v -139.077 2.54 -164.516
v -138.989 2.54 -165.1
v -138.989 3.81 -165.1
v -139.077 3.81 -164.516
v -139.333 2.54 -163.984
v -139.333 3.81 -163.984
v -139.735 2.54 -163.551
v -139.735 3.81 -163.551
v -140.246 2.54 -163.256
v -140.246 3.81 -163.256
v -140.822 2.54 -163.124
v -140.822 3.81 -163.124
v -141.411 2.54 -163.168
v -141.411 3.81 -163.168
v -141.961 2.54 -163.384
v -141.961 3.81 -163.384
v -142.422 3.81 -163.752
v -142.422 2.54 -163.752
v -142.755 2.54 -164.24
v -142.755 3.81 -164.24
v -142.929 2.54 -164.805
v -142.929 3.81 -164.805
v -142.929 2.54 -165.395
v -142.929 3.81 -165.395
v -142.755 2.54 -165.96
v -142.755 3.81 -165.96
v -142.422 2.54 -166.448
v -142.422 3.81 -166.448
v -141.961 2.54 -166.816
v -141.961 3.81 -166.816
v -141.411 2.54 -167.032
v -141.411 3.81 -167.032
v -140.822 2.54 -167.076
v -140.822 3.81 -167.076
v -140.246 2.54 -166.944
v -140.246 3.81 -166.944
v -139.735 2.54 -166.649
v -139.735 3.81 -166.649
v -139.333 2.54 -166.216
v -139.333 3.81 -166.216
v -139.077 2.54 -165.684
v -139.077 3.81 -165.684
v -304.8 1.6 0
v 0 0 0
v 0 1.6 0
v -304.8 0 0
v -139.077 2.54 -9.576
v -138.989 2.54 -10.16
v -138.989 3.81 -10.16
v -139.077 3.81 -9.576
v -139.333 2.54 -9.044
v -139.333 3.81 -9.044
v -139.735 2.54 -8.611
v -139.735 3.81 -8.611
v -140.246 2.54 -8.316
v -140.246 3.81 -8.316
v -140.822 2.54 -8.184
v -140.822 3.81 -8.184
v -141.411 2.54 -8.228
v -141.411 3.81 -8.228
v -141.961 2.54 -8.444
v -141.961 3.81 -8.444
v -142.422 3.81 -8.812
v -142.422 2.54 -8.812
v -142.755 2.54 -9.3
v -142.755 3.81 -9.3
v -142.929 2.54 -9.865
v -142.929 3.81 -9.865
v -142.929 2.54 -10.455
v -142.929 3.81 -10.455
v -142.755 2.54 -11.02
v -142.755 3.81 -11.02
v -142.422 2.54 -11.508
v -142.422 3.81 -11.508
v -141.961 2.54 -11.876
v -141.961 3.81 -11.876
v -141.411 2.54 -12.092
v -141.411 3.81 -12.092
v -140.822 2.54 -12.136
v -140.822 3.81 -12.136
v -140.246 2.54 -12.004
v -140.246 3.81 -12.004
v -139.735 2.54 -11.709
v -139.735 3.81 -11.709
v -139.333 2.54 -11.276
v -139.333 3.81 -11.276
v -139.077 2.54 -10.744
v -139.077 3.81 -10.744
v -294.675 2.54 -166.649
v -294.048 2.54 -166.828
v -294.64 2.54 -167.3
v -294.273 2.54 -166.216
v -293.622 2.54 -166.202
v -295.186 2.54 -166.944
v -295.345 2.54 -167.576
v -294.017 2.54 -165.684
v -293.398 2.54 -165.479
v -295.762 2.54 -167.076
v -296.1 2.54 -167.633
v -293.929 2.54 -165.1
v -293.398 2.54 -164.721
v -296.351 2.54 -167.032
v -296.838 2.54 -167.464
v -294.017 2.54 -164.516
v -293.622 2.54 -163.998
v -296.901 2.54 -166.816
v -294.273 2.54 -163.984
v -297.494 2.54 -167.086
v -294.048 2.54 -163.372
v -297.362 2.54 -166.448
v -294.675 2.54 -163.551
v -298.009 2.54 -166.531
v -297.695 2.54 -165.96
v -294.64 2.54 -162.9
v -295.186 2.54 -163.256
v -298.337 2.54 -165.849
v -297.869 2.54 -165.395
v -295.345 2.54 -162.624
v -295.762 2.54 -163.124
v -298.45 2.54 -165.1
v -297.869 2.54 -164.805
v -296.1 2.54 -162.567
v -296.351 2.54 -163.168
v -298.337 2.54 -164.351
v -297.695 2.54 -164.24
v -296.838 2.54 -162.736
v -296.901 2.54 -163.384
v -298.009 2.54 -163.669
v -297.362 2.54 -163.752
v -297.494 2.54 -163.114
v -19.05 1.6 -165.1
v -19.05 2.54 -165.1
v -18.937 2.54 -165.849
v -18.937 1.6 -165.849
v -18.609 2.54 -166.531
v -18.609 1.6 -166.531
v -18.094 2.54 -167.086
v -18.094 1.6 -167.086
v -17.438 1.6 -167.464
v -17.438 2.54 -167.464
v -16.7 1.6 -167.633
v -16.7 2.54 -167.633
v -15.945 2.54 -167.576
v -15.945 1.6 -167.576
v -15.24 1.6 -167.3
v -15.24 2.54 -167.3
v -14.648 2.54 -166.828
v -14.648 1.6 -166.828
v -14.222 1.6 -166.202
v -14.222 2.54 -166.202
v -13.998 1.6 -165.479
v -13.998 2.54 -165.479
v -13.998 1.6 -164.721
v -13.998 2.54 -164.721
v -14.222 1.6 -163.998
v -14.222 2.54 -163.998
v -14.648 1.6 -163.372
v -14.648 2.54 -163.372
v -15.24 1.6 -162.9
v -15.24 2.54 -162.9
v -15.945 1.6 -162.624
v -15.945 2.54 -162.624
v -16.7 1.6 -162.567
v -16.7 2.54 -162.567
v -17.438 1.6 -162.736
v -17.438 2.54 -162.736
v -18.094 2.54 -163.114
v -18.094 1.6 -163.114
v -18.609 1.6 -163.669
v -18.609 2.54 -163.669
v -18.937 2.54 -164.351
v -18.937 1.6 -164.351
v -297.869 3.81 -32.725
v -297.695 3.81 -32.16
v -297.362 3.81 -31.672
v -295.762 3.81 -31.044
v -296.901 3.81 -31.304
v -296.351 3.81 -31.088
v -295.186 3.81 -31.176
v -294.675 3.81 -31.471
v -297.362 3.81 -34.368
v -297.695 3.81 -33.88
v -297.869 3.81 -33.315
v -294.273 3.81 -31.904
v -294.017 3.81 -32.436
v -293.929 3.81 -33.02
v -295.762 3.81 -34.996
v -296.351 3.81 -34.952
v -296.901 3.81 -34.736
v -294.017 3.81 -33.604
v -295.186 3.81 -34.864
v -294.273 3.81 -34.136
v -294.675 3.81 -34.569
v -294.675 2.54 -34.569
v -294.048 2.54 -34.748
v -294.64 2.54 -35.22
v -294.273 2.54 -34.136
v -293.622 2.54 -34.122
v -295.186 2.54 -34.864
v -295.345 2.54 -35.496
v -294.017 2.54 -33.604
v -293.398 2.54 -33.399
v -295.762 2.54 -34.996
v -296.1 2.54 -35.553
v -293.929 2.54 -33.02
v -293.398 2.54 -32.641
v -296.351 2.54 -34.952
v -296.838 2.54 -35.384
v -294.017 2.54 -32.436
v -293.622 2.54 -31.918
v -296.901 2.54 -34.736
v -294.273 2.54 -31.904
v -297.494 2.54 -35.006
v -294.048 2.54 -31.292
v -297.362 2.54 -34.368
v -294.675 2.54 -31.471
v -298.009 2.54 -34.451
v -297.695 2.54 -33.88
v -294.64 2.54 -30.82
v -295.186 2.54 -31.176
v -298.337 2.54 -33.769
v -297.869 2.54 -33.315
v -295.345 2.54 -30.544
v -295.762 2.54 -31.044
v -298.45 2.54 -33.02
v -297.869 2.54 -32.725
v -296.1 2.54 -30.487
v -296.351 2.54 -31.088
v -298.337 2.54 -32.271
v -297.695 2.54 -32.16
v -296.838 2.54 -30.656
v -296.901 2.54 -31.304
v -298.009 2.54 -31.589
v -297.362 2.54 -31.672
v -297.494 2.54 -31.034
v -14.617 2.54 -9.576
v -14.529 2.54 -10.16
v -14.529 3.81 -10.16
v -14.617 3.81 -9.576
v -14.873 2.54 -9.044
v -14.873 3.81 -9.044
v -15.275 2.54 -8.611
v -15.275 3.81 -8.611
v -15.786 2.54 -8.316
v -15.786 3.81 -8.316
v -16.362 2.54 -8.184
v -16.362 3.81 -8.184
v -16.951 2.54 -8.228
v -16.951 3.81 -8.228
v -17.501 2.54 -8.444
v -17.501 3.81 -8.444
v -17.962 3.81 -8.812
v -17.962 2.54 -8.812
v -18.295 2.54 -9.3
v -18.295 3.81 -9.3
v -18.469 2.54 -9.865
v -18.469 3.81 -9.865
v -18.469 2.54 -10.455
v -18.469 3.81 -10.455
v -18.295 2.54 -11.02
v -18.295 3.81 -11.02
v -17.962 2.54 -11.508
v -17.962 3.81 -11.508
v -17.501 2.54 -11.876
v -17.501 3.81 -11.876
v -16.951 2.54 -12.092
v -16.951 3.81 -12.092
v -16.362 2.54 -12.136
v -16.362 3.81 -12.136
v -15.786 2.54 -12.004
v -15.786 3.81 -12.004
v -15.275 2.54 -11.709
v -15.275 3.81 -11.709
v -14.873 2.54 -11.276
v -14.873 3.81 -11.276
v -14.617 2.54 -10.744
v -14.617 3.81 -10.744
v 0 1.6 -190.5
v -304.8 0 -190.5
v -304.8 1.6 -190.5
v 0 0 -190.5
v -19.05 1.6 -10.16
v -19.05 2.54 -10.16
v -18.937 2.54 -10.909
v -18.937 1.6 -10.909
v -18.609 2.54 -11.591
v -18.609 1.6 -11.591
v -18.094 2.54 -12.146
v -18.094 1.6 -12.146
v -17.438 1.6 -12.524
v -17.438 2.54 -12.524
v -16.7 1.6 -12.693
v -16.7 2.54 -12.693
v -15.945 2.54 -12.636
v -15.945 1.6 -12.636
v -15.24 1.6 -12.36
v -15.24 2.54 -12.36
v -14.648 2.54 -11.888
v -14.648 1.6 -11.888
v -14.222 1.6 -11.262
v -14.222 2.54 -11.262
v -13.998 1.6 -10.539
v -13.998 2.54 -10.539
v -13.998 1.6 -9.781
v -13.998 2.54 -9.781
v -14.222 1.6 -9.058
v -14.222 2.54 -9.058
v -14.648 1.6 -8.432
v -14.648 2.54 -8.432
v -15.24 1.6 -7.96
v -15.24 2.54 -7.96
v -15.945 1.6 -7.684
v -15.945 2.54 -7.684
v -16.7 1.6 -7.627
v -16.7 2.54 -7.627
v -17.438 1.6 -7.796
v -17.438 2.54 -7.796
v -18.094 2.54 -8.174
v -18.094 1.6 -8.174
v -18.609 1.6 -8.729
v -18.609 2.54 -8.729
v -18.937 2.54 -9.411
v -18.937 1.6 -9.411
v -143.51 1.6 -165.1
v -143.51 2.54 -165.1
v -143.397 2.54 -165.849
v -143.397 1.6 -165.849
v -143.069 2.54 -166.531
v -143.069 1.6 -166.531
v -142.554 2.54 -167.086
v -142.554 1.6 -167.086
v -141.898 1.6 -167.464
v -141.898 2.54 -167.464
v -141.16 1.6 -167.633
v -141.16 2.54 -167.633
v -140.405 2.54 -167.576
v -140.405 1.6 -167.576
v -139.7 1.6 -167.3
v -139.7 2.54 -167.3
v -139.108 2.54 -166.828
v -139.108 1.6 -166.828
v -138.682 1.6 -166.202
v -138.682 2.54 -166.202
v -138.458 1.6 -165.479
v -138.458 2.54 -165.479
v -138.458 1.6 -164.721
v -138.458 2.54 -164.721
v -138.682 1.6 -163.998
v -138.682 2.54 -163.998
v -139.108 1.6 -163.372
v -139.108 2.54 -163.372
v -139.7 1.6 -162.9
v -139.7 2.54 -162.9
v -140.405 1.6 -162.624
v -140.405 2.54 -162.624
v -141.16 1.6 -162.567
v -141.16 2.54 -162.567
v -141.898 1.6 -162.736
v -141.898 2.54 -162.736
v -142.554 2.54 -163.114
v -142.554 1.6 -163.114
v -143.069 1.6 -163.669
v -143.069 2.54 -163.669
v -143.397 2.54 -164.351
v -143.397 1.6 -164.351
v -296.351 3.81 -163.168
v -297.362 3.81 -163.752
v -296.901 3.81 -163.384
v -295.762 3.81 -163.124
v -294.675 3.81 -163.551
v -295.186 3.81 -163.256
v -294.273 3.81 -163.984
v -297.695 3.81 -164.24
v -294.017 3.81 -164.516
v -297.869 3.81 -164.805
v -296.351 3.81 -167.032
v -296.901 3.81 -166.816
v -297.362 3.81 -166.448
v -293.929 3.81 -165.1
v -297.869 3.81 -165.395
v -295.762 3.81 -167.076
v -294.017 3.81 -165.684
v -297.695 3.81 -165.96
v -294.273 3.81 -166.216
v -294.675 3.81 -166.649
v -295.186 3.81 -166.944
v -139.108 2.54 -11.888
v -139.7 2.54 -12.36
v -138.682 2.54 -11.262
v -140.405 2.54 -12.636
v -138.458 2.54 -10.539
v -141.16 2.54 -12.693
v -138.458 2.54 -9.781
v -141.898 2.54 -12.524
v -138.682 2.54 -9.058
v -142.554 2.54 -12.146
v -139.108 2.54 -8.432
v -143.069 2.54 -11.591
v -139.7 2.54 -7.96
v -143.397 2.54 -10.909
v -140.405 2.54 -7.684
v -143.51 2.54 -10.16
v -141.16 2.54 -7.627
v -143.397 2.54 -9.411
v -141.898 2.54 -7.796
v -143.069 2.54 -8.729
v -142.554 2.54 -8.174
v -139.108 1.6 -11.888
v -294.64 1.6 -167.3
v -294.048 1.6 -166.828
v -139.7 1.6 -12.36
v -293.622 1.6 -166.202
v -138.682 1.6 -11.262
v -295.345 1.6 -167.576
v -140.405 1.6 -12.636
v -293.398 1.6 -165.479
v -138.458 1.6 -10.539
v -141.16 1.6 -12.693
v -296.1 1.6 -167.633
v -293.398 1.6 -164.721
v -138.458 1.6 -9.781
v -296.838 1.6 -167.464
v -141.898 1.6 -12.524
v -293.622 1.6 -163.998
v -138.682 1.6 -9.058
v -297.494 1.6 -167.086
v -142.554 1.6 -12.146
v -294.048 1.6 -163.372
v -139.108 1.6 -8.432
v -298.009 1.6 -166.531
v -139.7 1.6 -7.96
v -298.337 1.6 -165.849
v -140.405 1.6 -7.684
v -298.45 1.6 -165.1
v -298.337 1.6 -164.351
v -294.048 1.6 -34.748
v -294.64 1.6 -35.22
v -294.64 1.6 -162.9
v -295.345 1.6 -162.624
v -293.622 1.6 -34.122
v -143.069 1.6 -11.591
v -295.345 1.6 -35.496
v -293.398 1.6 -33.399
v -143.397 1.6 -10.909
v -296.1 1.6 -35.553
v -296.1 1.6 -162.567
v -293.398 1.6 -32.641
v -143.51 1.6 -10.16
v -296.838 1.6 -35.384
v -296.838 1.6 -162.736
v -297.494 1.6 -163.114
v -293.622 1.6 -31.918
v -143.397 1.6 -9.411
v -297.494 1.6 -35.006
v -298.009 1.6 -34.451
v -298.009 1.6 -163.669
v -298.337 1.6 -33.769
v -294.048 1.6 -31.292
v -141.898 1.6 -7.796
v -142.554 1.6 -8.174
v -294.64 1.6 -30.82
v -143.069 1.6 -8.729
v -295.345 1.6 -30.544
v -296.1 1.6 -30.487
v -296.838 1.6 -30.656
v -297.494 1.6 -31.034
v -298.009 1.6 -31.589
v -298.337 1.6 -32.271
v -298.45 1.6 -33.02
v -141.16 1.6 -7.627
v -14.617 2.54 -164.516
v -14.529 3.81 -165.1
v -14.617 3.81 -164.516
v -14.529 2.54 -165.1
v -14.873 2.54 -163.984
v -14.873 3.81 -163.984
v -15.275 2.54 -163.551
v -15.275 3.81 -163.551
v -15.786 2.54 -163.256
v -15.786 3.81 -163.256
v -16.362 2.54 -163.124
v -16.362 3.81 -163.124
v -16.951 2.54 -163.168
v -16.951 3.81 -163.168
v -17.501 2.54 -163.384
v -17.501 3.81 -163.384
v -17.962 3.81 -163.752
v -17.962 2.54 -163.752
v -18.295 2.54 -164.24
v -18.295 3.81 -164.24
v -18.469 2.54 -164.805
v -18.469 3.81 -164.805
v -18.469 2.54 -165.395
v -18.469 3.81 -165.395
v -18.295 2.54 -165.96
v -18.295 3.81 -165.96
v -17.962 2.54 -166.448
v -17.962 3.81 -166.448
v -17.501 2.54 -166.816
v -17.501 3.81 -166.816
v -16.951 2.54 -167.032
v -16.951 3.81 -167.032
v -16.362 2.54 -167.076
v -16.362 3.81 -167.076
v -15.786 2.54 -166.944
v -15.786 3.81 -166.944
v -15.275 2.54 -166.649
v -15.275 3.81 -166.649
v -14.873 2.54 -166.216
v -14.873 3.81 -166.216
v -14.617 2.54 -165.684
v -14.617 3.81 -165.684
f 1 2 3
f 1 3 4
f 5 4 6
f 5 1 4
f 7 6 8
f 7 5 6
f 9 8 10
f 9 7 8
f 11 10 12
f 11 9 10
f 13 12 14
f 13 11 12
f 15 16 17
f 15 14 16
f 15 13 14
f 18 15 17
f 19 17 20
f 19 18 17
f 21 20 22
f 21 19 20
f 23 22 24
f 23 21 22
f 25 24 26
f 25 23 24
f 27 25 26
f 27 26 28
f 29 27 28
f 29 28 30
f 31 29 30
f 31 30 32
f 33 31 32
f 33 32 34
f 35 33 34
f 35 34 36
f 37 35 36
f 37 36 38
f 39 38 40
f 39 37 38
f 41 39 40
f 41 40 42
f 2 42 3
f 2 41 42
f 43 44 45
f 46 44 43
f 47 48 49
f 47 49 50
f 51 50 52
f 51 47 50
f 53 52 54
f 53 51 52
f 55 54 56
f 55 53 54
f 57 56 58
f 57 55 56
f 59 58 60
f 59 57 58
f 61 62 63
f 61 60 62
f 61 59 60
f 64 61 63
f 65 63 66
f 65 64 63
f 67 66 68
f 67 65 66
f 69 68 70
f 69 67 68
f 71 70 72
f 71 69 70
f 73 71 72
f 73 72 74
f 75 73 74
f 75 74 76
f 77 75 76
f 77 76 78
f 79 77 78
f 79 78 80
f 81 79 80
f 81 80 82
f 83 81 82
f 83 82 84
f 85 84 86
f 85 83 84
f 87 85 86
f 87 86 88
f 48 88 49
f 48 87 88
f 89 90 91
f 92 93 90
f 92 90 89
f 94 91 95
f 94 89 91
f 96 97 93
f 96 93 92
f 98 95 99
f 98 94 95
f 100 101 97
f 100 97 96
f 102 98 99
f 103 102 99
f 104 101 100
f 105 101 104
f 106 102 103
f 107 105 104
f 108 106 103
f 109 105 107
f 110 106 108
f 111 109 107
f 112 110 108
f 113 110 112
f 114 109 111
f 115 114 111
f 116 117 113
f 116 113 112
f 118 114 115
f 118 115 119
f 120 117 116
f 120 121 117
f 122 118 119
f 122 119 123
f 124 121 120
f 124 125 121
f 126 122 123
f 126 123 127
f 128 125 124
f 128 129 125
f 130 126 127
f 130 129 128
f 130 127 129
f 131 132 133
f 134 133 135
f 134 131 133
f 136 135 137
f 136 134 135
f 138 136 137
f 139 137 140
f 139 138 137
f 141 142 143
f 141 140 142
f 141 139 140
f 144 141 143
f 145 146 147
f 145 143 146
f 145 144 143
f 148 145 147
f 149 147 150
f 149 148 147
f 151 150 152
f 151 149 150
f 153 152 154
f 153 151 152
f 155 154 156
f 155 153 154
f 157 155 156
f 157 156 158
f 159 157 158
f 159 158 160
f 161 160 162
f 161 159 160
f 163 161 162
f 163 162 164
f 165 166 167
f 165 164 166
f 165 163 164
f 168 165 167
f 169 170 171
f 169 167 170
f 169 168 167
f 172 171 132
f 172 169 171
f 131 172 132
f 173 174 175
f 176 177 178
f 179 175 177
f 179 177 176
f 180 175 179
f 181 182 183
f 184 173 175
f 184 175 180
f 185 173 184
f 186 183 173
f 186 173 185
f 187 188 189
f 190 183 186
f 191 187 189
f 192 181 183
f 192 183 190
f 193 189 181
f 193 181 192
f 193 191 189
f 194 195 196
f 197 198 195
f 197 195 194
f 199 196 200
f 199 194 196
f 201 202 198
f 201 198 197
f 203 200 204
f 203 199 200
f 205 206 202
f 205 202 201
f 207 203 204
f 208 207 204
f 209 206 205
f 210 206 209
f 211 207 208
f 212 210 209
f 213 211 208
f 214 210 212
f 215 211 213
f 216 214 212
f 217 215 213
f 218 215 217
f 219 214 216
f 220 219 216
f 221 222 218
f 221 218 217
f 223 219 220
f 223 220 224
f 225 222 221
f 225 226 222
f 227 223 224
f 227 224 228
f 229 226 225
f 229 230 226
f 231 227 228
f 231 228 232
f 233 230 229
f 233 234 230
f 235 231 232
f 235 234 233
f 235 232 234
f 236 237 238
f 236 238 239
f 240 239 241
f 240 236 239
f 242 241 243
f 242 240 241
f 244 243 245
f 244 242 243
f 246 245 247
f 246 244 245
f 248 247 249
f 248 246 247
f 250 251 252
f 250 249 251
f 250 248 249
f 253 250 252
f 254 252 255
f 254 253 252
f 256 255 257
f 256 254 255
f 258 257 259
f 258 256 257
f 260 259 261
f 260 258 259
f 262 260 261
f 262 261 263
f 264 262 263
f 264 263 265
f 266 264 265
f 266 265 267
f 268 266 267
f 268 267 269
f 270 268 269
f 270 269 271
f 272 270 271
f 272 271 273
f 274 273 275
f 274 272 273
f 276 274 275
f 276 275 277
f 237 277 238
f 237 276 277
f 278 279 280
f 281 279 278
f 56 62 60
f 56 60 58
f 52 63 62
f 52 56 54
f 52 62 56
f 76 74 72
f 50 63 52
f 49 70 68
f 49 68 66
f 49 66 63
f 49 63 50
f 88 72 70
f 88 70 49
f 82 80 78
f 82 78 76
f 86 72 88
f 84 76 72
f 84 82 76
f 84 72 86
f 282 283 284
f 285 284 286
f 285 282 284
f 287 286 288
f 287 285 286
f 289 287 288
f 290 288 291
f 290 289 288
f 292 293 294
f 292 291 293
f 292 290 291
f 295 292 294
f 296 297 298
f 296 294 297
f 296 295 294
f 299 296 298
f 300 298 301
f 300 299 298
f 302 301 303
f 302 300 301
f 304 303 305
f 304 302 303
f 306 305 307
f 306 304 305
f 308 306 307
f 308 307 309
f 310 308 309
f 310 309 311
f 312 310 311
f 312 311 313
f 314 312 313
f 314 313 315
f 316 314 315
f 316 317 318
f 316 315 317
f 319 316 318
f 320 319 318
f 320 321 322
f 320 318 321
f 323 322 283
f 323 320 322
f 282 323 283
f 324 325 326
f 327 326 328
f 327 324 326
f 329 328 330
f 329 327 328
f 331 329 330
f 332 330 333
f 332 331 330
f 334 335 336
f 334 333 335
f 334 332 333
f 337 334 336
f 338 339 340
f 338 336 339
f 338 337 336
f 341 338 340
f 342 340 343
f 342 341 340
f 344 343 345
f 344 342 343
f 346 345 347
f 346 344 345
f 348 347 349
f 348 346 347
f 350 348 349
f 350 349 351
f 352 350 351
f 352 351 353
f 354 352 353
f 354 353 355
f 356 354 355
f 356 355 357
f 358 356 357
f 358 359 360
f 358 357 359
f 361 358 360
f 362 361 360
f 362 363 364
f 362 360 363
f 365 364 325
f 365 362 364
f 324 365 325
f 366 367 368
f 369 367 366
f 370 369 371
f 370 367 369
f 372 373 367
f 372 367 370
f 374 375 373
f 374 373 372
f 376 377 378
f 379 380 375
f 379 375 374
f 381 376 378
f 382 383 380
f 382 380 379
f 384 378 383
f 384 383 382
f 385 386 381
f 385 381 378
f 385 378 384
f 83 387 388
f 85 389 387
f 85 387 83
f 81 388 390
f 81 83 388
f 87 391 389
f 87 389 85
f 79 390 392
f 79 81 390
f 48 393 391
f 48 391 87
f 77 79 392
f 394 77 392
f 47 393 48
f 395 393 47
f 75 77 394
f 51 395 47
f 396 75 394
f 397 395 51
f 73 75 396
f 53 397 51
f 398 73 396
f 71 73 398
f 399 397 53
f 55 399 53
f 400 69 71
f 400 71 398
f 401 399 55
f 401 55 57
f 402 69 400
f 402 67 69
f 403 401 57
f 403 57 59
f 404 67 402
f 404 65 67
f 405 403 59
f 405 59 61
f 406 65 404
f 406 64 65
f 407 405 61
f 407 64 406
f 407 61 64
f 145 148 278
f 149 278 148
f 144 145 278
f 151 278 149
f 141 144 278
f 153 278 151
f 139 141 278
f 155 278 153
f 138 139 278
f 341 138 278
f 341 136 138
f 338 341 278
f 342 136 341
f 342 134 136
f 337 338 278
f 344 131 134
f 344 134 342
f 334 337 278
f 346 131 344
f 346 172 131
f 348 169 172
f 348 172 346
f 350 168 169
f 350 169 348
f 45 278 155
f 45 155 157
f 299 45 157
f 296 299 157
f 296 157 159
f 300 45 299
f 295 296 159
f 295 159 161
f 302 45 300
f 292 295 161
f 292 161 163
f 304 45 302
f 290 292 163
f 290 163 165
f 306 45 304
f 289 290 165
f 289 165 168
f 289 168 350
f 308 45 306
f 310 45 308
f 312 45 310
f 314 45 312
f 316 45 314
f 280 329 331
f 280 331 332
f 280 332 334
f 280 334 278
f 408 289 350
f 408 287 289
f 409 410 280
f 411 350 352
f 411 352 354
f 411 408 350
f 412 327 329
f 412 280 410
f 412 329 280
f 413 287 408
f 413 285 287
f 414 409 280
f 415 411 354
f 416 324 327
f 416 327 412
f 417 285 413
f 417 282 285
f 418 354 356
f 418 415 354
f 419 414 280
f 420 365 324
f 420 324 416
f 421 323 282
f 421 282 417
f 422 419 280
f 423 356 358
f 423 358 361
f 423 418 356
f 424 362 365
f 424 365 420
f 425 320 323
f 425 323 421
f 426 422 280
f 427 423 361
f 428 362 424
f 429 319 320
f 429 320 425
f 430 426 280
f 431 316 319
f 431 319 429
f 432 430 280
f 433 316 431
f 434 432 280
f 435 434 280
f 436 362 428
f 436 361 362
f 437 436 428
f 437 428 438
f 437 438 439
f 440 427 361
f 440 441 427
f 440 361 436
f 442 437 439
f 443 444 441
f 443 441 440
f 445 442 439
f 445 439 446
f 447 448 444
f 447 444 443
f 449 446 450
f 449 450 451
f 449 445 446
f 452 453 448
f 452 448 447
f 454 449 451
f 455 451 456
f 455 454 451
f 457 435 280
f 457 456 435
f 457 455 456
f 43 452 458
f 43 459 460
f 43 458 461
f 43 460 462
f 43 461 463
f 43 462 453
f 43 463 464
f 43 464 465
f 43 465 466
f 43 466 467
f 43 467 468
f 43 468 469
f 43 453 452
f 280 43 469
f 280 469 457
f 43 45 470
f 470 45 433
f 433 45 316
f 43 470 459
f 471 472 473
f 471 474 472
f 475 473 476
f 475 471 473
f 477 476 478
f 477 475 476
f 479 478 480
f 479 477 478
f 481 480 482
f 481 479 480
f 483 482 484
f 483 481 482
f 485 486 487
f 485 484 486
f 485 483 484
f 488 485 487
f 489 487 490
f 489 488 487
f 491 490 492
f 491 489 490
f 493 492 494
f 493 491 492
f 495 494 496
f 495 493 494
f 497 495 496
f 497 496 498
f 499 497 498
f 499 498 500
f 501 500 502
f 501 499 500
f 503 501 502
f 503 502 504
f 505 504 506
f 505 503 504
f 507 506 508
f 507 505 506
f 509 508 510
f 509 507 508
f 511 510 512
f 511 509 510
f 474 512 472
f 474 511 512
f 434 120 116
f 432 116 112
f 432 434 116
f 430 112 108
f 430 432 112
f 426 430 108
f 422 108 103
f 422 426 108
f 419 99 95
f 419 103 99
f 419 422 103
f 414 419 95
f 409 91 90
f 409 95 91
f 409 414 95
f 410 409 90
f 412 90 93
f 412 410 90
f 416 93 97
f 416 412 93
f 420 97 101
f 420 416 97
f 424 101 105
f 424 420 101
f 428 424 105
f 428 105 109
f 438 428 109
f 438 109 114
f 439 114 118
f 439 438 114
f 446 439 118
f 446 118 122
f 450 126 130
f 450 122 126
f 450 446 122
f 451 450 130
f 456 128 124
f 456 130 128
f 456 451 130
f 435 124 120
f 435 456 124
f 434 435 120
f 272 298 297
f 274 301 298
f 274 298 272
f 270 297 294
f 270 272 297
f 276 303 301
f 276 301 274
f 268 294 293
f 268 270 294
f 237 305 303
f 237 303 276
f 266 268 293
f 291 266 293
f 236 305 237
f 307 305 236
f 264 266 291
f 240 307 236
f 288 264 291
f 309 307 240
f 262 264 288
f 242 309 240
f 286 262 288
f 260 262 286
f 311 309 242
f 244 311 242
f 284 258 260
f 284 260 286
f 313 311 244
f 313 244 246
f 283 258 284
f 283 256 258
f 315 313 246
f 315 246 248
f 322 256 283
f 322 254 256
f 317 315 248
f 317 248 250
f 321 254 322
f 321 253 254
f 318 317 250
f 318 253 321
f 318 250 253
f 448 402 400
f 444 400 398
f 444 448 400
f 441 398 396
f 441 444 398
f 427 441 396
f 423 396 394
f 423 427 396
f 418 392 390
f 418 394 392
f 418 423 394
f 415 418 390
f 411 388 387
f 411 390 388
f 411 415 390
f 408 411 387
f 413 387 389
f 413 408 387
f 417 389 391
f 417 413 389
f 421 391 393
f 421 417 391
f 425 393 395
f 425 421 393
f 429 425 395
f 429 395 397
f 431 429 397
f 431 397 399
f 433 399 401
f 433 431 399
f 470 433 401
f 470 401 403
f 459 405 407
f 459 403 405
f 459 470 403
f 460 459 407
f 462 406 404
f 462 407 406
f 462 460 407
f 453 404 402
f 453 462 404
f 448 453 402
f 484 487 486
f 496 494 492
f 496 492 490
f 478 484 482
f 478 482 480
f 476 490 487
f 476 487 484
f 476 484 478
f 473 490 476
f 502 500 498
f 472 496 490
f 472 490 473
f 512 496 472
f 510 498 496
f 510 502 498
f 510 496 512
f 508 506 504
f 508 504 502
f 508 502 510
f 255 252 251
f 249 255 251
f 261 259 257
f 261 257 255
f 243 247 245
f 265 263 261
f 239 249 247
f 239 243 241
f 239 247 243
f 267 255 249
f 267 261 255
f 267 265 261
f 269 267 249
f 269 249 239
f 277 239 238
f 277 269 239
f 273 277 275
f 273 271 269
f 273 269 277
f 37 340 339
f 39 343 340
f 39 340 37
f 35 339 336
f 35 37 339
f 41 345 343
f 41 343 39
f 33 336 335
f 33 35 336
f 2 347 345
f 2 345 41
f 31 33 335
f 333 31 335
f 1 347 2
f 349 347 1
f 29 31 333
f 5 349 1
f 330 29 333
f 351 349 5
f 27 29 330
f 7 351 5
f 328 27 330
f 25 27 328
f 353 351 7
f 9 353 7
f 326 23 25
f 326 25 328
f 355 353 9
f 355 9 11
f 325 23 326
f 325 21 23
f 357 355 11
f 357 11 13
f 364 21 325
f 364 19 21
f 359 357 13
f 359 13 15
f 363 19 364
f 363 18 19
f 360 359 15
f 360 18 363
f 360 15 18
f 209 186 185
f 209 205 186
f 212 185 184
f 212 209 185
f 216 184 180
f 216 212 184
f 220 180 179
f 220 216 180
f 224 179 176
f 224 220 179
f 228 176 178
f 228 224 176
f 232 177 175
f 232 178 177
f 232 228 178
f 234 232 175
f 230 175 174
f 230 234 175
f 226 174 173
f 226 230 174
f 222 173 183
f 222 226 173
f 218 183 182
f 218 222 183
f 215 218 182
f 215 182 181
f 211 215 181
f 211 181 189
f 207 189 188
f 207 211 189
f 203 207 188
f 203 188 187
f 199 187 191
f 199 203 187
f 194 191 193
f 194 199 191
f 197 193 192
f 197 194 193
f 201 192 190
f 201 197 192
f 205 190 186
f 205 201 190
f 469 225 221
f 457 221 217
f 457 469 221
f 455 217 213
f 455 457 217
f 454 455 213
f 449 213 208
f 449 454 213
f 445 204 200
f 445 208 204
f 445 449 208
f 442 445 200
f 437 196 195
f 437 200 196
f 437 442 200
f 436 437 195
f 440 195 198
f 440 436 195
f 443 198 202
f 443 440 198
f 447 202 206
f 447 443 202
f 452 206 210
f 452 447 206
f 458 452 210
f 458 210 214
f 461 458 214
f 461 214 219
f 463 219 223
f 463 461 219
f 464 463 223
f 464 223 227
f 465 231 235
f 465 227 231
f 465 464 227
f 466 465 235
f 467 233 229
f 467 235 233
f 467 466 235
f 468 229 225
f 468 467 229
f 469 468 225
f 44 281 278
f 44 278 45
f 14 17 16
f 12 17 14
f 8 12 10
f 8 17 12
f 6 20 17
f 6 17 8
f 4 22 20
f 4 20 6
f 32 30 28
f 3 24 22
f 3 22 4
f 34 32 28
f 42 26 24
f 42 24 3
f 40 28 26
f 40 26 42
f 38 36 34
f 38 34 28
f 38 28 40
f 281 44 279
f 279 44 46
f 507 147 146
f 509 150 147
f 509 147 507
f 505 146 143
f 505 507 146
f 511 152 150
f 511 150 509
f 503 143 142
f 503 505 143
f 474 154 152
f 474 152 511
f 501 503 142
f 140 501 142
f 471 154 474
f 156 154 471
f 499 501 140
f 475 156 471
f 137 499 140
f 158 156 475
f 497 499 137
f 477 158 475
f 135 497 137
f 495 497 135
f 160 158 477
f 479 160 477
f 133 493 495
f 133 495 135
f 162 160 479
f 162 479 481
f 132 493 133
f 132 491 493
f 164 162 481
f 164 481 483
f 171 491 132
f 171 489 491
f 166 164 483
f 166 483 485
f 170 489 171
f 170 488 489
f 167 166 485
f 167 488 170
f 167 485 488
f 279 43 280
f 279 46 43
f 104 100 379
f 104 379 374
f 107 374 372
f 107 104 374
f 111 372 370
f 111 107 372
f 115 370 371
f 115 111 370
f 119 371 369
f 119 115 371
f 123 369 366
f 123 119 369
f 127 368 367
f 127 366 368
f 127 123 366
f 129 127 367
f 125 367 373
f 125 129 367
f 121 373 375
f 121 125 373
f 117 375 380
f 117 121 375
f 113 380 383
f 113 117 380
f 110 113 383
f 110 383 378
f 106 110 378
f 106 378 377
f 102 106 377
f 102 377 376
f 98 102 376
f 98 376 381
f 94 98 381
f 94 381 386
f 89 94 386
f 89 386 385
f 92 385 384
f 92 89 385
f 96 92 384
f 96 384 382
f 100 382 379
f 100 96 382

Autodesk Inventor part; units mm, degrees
ref_plane "YZ Plane" through (0, 0, 0) normal (1, 0, 0) x (0, 1, 0)
ref_plane "XZ Plane" through (0, 0, 0) normal (0, 1, 0) x (-1, 0, 0)
ref_plane "XY Plane" through (0, 0, 0) normal (0, 0, 1) x (1, 0, 0)
sketch "Sketch1" plane through (0, 0, 0) normal (0, 1, 0) x (-1, 0, 0)
  line L0 (0, 0) -> (304.8, 0)
  line L1 (304.8, 0) -> (304.8, -190.5)
  line L2 (304.8, -190.5) -> (0, -190.5)
  line L3 (0, -190.5) -> (0, 0)
  dimension "d0" = 304.8
  dimension "d1" = 190.5
extrude "Extrusion1" add sketch "Sketch1" along normal blind 1.6
sketch "Sketch2" plane through (0, 1.6, 0) normal (0, 1, 0) x (1, 0, 0)
  line L0 (-304.8, 0) -> (0, 0)
  line L1 (-140.97, 0) -> (-140.97, 10.16)
  line L2 (-140.97, 0) -> (-130.81, 0) construction
  line L3 (-140.97, 10.16) -> (-140.97, 33.02)
  line L4 (-140.97, 33.02) -> (-255.8376, 33.02)
  line L5 (-140.97, 10.16) -> (-95.25, 10.16)
  line L6 (-95.25, 10.16) -> (-16.51, 10.16)
  line L7 (-16.51, 10.16) -> (-16.51, 165.1)
  line L8 (-140.97, 10.16) -> (-140.97, 165.1)
  line L9 (0, 0) -> (0, 190.5)
  line L10 (-16.51, 165.1) -> (-295.91, 165.1)
  line L11 (-295.91, 165.1) -> (-295.91, 33.02)
  line L12 (-295.91, 33.02) -> (-255.8376, 33.02)
  circle A0 centre (-295.91, 33.02) radius 2.54
  circle A1 centre (-295.91, 165.1) radius 2.54
  circle A2 centre (-140.97, 165.1) radius 2.54
  circle A3 centre (-16.51, 165.1) radius 2.54
  circle A4 centre (-16.51, 10.16) radius 2.54
  circle A5 centre (-140.97, 10.16) radius 2.54
  point P0 (-299.72, 0)
  point P1 (-5.08, 0)
  point P2 (0, 5.08)
  point P3 (0, 185.42)
  dimension "d5" = 10.16
  dimension "d6" = 90
  dimension "d8" = 78.74
  dimension "d9" = 45.72
  dimension "d10" = 22.86
  dimension "d11" = 154.94
  dimension "d12" = 154.94
  dimension "d13" = 16.51
  dimension "d14" = 279.4
  dimension "d15" = 5.08
  dimension "d16" = 5.08
  dimension "d17" = 5.08
  dimension "d18" = 5.08
  dimension "d19" = 5.08
  dimension "d20" = 5.08
extrude "Extrusion2" cut sketch "Sketch2" against normal through all contours A5 L3 L1 | L1 L5 A5 | L3 A5 L5 | A2 L10 L8 | L8 L10 A2 | A4 L7 L6 | L6 L7 A4 | A0 L11 L12 | L12 L11 A0 | L10 A2 | A1 L11 L10 | L10 L11 A1 | A3 L7 L10 | L10 L7 A3
sketch "Sketch3" plane through (0, 0, 0) normal (0, 1, 0) x (-1, 0, 0)
  circle A0 centre (16.51, -165.1) radius 2.54
  circle A1 centre (16.51, -165.1) radius 2.3813
  circle A2 centre (16.51, -10.16) radius 2.54
  circle A3 centre (16.51, -10.16) radius 2.3813
  circle A4 centre (140.97, -10.16) radius 2.54
  circle A5 centre (140.97, -10.16) radius 2.3813
  circle A6 centre (295.91, -33.02) radius 2.54
  circle A7 centre (295.91, -33.02) radius 2.3813
  circle A8 centre (295.91, -165.1) radius 2.54
  circle A9 centre (295.91, -165.1) radius 2.3813
  circle A10 centre (140.97, -165.1) radius 2.54
  circle A11 centre (140.97, -165.1) radius 2.3813
  point P0 (0, 0)
extrude "Extrusion3" add sketch "Sketch3" along normal blind 2.54 contours A0 | A1 | A2 | A3 | A4 | A5 | A6 | A7 | A8 | A9 | A10 | A11
sketch "Sketch4" plane through (-140.97, 2.54, -10.16) normal (0, 1, 0) x (1, 0, 0)
  circle A0 centre (0, 0) radius 1.9812
  circle A1 centre (-154.94, 22.86) radius 2.54
  circle A2 centre (-154.94, 22.86) radius 1.9812
  circle A3 centre (0, 154.94) radius 2.54
  circle A4 centre (0, 154.94) radius 1.9812
  circle A5 centre (124.46, 154.94) radius 2.54
  circle A6 centre (124.46, 154.94) radius 1.9812
  circle A7 centre (-154.94, 154.94) radius 2.54
  circle A8 centre (-154.94, 154.94) radius 1.9812
  circle A9 centre (124.46, 0) radius 2.54
  circle A10 centre (124.46, 0) radius 1.9812
  point P0 (140.97, -10.16)
  dimension "d25" = 3.9624
  dimension "d26" = 3.9624
  dimension "d27" = 3.9624
  dimension "d28" = 3.9624
  dimension "d29" = 3.9624
extrude "Extrusion4" add sketch "Sketch4" along normal blind 1.27 contours A0 | A2 | A4 | A6 | A8 | A10
equation "\"d12\" = d11"
equation "\"d16\" = d15"
equation "\"d17\" = d15"
equation "\"d18\" = d15"
equation "\"d19\" = d15"
equation "\"d20\" = d15"
properties part number "MotherboardPlate"
